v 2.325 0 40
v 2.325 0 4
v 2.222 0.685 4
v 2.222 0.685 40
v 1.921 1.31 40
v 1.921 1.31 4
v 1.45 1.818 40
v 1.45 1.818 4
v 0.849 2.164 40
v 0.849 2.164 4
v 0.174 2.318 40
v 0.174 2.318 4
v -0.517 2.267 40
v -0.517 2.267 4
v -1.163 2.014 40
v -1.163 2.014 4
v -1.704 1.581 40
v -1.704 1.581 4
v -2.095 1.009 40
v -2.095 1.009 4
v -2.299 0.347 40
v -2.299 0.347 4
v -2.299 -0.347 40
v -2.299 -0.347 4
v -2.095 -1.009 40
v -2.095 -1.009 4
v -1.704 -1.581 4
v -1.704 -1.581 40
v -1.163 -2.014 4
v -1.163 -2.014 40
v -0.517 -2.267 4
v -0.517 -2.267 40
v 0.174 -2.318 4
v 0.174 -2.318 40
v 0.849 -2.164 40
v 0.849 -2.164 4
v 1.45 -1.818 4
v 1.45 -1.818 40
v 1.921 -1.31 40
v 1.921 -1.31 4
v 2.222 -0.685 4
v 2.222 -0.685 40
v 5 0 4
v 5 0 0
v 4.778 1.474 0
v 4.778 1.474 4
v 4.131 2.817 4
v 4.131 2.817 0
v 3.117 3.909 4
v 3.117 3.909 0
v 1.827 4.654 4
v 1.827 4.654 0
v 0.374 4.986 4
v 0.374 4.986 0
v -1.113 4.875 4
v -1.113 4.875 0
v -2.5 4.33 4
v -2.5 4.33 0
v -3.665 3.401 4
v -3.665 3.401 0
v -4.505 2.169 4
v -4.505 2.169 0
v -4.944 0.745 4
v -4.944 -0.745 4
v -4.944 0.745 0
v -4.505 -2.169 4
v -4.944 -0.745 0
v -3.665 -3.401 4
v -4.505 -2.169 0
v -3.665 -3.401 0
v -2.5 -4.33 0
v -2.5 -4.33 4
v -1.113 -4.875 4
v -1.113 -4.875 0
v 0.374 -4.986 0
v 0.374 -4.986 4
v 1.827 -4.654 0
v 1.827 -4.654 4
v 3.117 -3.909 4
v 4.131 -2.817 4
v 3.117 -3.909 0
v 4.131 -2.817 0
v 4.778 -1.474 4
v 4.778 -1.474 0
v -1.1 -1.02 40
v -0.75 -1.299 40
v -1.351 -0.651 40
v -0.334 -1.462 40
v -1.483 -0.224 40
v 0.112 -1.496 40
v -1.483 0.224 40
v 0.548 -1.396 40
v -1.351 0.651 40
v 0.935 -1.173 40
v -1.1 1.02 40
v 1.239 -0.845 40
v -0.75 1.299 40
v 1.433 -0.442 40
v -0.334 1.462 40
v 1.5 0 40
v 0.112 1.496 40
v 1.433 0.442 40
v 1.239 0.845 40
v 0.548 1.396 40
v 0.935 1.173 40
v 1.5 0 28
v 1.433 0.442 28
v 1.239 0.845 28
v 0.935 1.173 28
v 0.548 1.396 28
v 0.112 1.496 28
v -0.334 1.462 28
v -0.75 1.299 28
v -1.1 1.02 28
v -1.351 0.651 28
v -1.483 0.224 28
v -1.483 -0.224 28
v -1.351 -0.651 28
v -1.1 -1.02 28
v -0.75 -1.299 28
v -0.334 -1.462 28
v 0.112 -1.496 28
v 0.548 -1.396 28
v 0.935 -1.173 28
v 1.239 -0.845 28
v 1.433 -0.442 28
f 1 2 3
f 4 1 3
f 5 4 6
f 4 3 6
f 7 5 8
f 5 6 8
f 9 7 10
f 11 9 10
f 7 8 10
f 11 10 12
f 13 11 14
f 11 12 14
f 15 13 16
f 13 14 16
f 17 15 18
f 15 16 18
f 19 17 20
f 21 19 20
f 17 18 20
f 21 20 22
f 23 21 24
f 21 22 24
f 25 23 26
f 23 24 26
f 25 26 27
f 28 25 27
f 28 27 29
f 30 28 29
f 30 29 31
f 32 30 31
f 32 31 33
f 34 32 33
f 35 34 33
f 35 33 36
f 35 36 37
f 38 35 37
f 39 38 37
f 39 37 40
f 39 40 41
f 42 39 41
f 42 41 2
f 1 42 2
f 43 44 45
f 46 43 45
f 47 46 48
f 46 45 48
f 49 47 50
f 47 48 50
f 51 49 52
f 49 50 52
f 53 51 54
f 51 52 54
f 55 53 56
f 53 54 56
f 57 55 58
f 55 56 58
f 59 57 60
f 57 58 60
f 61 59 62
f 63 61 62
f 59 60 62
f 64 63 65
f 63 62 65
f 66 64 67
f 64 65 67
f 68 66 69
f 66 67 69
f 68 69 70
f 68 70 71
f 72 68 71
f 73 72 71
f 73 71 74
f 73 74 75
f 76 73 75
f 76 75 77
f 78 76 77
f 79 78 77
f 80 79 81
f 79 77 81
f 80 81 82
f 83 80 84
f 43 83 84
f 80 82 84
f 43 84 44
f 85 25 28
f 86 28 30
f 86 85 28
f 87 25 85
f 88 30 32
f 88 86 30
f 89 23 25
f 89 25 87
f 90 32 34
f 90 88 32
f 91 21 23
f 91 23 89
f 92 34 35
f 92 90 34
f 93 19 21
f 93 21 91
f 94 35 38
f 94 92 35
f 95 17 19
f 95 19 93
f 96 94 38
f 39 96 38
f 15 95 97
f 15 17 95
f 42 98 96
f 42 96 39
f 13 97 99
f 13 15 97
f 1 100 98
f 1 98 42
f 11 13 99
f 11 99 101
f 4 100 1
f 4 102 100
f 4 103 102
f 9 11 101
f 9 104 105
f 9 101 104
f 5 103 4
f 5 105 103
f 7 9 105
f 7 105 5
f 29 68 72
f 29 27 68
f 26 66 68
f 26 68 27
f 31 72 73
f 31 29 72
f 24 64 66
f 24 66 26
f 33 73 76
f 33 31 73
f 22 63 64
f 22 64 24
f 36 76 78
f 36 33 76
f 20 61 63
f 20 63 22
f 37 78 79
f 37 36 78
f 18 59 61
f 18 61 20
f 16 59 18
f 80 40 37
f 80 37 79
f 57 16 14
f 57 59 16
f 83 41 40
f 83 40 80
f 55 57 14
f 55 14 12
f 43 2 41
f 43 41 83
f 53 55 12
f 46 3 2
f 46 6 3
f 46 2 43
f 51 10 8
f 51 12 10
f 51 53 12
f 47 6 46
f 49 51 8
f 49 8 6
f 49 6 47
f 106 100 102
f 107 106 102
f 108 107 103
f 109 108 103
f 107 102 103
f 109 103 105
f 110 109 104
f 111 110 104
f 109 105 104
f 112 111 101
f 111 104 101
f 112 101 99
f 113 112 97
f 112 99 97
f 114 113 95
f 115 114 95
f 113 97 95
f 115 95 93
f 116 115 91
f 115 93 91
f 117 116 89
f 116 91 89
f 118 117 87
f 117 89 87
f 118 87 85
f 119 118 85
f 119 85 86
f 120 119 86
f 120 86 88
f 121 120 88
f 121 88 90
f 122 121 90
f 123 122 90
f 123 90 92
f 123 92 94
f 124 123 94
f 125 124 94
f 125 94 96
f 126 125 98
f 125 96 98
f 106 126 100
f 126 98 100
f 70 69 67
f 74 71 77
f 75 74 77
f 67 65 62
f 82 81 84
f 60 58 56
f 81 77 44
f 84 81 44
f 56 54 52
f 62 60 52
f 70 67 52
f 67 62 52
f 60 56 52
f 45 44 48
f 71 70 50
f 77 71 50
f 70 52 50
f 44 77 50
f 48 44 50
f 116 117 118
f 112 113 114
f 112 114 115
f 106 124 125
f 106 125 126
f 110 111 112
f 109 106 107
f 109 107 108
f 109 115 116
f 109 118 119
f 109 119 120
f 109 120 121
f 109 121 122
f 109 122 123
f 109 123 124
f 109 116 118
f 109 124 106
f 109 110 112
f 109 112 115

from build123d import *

# Parameters (mm, degrees)
F0_R     = 2.325
F1_DEPTH = 40
F0_R_2   = 5
F2_DEPTH = 4
F3_R     = 1.5
F4_DEPTH = 12


with BuildPart() as f1:
    # F0 (on Top) → F1 (new body)
    with BuildSketch(Plane.XY):
        Circle(F0_R)
    extrude(amount=F1_DEPTH)

    # F0 (on Top) → F2 (join)
    with BuildSketch(Plane.XY):
        Circle(F0_R_2)
        Circle(F0_R, mode=Mode.SUBTRACT)
    extrude(amount=F2_DEPTH)

    # F3 (on face) → F4 (cut)
    with BuildSketch(Plane.XY.offset(40)):
        Circle(F3_R)
    extrude(amount=-F4_DEPTH, mode=Mode.SUBTRACT)


solid = f1.part
